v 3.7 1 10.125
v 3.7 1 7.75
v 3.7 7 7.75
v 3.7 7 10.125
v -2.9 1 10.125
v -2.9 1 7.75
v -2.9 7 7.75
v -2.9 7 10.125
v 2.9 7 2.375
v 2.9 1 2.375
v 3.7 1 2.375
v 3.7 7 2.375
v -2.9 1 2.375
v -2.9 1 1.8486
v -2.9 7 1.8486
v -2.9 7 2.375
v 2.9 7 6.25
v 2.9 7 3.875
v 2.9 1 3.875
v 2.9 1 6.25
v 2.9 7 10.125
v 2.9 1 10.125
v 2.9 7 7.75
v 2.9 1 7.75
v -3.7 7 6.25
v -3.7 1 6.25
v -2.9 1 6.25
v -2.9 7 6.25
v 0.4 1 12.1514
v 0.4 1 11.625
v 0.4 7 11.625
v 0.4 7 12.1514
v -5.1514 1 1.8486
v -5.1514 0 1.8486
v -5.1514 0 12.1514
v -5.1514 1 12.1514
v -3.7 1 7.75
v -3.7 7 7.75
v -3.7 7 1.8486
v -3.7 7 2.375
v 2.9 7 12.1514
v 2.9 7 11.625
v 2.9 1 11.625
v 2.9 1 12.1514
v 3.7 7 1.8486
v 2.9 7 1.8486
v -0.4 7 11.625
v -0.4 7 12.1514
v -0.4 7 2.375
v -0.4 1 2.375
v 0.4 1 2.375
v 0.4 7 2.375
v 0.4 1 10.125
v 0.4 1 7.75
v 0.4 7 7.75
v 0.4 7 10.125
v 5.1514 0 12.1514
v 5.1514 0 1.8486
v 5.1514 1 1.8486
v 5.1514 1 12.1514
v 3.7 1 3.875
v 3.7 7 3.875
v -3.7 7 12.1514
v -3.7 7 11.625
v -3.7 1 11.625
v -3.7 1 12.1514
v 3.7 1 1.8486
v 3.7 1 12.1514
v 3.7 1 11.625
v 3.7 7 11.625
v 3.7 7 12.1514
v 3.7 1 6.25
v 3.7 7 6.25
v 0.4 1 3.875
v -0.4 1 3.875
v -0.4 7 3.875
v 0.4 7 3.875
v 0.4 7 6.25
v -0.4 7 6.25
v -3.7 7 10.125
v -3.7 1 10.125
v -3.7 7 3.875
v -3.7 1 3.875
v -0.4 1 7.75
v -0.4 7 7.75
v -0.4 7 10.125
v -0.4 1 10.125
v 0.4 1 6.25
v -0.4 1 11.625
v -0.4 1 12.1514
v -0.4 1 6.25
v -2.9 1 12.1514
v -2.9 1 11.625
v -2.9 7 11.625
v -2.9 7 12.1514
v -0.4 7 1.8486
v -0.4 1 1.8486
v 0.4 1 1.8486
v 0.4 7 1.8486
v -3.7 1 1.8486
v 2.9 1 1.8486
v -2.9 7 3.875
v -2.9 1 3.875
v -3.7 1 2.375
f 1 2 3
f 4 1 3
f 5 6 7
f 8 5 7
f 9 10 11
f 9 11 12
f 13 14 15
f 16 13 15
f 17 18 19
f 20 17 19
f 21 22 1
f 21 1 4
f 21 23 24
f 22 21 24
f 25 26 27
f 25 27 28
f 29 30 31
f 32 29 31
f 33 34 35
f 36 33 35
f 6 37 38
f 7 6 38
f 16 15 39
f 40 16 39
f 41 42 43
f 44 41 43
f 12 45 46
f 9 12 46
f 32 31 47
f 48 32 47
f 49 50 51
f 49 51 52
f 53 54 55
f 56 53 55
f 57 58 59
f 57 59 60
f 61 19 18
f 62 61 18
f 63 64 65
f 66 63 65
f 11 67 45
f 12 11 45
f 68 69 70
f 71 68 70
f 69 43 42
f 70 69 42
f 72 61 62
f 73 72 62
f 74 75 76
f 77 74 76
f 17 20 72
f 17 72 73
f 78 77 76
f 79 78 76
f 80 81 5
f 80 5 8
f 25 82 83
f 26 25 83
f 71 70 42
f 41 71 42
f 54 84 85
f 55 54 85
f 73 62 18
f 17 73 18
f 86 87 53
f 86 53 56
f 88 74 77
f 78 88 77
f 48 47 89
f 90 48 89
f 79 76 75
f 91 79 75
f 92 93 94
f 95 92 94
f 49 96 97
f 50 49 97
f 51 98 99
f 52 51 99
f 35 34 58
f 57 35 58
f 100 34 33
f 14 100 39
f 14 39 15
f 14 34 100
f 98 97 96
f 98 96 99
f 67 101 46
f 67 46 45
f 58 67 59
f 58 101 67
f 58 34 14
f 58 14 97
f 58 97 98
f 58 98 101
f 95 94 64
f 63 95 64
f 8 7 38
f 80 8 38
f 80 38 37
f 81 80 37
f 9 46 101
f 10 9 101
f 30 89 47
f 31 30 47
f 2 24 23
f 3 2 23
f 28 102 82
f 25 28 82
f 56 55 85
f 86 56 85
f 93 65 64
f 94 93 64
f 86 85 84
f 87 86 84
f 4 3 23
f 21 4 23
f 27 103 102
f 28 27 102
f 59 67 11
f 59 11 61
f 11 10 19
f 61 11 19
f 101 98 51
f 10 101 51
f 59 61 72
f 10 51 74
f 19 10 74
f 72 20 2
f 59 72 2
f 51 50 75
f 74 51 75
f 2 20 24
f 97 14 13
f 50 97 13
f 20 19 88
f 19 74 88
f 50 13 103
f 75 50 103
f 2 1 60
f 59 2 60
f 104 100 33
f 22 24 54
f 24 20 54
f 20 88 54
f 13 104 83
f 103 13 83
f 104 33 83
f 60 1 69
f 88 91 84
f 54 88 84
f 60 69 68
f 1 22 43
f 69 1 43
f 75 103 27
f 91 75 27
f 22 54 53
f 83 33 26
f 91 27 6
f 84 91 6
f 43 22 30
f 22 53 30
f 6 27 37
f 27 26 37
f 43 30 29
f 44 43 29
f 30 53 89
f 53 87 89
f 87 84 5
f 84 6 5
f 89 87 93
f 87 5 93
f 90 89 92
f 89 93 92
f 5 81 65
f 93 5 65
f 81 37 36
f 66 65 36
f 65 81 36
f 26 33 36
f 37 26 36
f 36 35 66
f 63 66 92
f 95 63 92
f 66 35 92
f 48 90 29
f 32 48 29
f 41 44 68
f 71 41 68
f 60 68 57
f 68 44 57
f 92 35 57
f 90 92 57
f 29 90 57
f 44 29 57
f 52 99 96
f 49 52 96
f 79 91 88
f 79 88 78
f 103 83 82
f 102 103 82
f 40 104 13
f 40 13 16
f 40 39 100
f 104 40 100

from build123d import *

# Parameters (mm, degrees)
BOSS_EXTRUDE1_DEPTH = 14
SKETCH2_W           = 1.5
SKETCH2_H           = 6
CUT_EXTRUDE1_DEPTH  = 22
SKETCH12_W          = 14
SKETCH12_H          = 14
SKETCH12_W_2        = 10.30277124
SKETCH12_H_2        = 10.30277124
CUT_EXTRUDE2_DEPTH  = 18.146428199


with BuildPart() as part:
    # Sketch1 → Boss-Extrude1 (new body)
    with BuildSketch(Plane.XY):
        Polygon((-7, 0), (7, 0), (7, 7), (6.2, 7), (6.2, 1), (3.7, 1), (3.7, 7), (2.9, 7), (2.9, 1), (0.4, 1), (0.4, 7), (-0.4, 7), (-0.4, 1), (-2.9, 1), (-2.9, 7), (-3.7, 7), (-3.7, 1), (-6.2, 1), (-6.2, 7), (-7, 7), align=None)
    extrude(amount=BOSS_EXTRUDE1_DEPTH)

    # Sketch2 → Cut-Extrude1 (cut, through all)
    with BuildSketch(Plane.ZY.offset(7)):
        with Locations((3.125, 4)):
            Rectangle(SKETCH2_W, SKETCH2_H)
        with Locations((7, 4)):
            Rectangle(SKETCH2_W, SKETCH2_H)
        with Locations((10.875, 4)):
            Rectangle(SKETCH2_W, SKETCH2_H)
    extrude(amount=-CUT_EXTRUDE1_DEPTH, mode=Mode.SUBTRACT)

    # Sketch12 → Cut-Extrude2 (cut, through all)
    with BuildSketch(Plane.XZ):
        with Locations((0, 7)):
            Rectangle(SKETCH12_W, SKETCH12_H)
        with Locations((0, 7)):
            Rectangle(SKETCH12_W_2, SKETCH12_H_2, mode=Mode.SUBTRACT)
    extrude(amount=-CUT_EXTRUDE2_DEPTH, mode=Mode.SUBTRACT)


solid = part.part
